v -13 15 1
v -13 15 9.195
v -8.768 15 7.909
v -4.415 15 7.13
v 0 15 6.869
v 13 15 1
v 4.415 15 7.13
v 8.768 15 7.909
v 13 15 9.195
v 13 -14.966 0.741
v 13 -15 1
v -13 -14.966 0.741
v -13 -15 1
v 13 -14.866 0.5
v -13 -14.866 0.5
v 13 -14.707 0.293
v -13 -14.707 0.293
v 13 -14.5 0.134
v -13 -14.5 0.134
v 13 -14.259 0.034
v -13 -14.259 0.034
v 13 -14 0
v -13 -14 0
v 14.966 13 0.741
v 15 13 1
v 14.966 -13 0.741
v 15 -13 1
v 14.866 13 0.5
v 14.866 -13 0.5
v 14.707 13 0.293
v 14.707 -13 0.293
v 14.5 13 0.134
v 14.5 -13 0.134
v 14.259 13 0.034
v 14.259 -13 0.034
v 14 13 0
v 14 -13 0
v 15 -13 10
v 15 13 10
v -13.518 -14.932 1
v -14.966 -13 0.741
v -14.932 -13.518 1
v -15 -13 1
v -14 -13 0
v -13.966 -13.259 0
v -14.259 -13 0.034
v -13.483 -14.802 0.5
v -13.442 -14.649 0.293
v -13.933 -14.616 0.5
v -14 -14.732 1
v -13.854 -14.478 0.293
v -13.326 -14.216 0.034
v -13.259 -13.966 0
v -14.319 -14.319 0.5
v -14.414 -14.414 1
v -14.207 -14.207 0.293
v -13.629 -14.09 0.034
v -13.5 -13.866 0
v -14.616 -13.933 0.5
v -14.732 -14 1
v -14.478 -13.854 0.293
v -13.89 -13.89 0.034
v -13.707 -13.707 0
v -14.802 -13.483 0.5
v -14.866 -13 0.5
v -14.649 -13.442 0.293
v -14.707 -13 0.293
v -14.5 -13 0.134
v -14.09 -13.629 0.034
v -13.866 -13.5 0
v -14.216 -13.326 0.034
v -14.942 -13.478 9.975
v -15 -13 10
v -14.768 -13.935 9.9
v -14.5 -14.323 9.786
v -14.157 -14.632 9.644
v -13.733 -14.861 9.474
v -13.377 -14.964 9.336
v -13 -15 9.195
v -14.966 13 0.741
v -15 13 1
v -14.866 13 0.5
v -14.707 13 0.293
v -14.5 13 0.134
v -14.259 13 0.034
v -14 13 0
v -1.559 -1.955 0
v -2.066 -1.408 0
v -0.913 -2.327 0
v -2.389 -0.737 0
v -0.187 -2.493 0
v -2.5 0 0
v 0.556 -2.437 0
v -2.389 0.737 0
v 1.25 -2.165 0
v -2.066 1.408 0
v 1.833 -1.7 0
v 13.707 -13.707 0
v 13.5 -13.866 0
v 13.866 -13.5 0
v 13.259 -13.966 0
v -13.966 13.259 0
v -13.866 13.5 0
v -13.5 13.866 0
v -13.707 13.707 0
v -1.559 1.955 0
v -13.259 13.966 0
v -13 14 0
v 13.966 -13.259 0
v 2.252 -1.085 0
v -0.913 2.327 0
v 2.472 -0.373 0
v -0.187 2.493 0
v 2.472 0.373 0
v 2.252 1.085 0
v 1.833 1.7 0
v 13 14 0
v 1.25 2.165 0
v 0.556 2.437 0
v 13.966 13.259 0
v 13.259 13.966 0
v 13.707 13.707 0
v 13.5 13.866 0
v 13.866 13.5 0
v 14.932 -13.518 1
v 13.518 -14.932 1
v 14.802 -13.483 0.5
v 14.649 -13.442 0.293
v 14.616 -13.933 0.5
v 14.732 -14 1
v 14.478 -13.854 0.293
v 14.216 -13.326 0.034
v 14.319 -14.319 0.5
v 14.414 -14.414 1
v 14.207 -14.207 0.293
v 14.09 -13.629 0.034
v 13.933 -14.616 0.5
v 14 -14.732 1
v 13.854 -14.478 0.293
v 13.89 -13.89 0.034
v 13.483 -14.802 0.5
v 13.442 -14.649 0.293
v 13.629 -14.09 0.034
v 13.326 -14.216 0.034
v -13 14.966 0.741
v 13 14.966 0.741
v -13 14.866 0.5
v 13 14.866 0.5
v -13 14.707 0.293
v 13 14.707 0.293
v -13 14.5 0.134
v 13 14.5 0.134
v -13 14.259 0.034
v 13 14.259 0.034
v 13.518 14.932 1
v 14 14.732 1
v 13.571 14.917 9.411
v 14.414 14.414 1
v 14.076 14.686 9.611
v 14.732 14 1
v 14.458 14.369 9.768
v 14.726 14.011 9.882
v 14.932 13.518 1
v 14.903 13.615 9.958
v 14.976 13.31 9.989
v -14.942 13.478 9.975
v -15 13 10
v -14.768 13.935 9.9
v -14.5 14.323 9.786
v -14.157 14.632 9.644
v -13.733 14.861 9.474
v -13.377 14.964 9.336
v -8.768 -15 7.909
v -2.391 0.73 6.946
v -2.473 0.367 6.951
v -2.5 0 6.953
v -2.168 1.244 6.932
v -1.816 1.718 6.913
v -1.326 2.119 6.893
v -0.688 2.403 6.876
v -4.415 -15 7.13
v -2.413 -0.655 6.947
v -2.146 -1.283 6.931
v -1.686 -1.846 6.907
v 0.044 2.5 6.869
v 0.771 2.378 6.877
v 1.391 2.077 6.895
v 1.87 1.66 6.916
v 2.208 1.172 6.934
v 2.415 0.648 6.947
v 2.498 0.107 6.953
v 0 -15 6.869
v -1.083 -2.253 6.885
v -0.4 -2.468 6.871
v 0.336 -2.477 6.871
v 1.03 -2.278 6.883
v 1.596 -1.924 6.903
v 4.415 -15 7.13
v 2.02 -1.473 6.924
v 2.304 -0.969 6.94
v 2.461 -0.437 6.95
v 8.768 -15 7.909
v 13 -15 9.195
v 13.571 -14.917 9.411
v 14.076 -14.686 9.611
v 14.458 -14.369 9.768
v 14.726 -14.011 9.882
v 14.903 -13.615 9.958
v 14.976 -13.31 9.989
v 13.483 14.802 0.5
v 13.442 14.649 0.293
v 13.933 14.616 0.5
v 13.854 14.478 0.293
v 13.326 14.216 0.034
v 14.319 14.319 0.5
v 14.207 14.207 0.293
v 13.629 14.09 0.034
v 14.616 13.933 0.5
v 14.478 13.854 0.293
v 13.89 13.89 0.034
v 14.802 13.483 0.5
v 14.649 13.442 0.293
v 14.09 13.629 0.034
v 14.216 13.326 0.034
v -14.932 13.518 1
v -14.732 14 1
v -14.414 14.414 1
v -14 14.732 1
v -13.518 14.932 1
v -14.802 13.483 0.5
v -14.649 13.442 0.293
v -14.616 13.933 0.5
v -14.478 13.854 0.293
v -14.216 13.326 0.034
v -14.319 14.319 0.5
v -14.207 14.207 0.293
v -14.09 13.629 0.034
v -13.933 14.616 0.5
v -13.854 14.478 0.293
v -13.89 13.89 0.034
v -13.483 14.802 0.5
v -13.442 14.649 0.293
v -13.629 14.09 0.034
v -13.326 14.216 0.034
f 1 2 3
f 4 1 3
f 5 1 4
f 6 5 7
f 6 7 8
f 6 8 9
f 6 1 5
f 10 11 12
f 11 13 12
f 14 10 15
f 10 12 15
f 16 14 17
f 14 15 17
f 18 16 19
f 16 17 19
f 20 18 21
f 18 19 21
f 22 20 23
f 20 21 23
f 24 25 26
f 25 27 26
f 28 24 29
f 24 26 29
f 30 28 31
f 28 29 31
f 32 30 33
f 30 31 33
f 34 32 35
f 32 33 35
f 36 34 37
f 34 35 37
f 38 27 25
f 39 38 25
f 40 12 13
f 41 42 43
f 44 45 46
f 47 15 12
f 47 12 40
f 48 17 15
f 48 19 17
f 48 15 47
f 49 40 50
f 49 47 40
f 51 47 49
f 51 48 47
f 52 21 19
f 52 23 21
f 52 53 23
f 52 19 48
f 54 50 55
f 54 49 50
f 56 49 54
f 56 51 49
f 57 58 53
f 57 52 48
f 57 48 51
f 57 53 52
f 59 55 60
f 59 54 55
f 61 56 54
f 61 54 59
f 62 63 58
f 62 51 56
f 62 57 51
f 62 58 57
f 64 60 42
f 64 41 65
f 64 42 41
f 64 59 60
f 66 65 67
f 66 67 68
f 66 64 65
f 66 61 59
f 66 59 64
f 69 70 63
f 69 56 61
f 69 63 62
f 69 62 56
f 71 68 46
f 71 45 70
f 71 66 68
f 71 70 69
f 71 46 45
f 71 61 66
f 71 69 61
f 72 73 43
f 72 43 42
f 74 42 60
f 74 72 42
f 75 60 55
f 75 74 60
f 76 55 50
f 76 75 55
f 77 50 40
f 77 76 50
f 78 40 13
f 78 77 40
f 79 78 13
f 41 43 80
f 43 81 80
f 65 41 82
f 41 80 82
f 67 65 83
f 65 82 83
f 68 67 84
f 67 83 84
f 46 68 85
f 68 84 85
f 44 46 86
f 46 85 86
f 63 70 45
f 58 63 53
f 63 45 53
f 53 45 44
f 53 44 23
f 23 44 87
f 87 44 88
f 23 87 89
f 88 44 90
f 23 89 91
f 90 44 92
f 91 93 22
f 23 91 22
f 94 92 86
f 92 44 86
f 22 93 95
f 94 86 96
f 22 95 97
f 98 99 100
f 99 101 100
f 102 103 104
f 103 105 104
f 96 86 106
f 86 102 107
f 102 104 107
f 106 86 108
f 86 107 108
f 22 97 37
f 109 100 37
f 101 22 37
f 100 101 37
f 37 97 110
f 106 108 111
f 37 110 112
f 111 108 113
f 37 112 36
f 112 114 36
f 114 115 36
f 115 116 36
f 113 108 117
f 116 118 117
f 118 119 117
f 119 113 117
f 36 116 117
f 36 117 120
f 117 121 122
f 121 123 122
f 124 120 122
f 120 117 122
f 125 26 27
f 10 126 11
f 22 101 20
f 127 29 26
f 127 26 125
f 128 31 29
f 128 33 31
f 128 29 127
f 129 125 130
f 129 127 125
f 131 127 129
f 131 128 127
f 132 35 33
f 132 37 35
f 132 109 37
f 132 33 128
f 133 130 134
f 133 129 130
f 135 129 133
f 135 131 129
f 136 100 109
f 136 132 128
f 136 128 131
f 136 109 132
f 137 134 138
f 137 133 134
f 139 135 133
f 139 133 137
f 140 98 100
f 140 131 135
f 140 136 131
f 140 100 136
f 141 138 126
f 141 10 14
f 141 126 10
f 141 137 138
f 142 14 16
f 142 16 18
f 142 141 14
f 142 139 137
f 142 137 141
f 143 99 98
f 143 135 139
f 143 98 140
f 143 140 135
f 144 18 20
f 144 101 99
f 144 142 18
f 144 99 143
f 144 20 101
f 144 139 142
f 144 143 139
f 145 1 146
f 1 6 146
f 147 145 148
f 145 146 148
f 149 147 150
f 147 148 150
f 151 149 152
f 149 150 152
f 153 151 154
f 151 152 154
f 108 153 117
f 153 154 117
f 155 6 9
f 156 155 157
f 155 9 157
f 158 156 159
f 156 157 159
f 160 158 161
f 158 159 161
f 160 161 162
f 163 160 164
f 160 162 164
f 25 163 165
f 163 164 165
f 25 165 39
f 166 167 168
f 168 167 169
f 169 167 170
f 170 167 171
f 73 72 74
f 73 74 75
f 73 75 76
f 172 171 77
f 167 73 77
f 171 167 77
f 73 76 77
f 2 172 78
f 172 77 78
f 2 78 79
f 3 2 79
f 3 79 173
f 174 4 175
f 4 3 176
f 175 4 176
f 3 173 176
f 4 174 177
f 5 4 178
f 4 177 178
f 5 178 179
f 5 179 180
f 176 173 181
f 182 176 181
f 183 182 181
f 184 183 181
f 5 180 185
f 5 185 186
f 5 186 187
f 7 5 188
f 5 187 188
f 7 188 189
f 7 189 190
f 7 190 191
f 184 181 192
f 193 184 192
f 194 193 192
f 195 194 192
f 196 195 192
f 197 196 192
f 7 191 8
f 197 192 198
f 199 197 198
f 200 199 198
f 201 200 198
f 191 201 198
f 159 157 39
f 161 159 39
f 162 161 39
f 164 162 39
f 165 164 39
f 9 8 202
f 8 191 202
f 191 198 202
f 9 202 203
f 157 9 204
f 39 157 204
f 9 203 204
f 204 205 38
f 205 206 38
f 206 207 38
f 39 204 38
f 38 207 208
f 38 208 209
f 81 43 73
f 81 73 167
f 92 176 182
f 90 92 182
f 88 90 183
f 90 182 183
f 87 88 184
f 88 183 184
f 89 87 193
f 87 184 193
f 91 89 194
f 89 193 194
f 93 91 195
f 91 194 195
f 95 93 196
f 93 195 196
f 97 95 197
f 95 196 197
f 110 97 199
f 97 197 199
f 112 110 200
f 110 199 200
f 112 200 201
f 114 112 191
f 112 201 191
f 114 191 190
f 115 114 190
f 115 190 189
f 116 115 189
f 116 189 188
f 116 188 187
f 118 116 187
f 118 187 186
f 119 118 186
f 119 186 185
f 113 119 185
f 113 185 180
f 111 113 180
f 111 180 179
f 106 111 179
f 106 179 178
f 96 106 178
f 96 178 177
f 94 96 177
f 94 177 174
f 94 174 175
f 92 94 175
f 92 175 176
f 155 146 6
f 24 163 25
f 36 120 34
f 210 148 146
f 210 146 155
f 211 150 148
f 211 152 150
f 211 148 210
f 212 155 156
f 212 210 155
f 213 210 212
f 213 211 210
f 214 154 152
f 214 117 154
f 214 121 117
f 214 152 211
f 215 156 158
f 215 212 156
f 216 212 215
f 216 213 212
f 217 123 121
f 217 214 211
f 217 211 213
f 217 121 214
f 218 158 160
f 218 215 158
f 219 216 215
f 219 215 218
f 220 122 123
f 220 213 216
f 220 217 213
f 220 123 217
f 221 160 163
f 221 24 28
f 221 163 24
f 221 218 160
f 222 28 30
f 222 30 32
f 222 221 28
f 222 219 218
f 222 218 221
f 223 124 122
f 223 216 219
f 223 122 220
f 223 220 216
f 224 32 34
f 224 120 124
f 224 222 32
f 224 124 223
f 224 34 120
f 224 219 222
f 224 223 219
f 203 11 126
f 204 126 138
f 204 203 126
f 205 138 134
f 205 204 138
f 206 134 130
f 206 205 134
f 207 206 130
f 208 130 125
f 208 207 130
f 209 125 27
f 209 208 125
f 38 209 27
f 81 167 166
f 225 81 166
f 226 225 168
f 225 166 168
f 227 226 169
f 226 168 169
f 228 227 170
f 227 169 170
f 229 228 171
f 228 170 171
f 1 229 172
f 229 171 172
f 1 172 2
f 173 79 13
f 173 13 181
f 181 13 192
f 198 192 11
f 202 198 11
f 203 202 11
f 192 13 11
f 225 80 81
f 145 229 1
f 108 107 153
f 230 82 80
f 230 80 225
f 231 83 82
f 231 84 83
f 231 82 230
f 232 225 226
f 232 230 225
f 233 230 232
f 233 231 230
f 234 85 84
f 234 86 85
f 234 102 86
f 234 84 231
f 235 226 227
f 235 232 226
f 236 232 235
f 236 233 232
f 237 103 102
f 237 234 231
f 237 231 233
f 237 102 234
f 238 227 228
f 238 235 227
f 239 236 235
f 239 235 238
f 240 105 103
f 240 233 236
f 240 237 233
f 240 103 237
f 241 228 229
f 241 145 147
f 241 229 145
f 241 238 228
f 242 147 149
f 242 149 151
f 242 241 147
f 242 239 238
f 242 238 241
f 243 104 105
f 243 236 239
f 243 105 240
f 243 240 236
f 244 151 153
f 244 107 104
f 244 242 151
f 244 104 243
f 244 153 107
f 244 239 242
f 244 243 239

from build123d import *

# Parameters (mm, degrees)
F0_W     = 30
F0_H     = 30
F1_DEPTH = 10
F3_DEPTH = 50
F5_D     = 5
F6_R     = 2
F7_R     = 1


with BuildPart() as f1:
    # F0 (on Top) → F1 (new body)
    with BuildSketch(Plane.XY):
        Rectangle(F0_W, F0_H)
    extrude(amount=F1_DEPTH)

    # F2 (on face) → F3 (cut)
    with BuildSketch(Plane.XZ.offset(15)):
        with BuildLine():
            Line((15, 10), (-15, 10))
            ThreePointArc((-15, 10), (0, 6.869318), (15, 10))
        make_face()
    extrude(amount=-F3_DEPTH, mode=Mode.SUBTRACT)

    # F5 (through all)
    with Locations(Plane(origin=(0, 0, 0), x_dir=(1, 0, 0), z_dir=(0, 0, -1))):
        with Locations((0, 0)):
            Hole(F5_D / 2)

    # F6
    f6_edges = [f1.edges().sort_by_distance(p)[0] for p in [
        (-15, -15, 5),
        (15, -15, 5),
        (15, 15, 5),
        (-15, 15, 5),
    ]]
    fillet(f6_edges, radius=F6_R)

    # F7
    f7_edges = [f1.edges().sort_by_distance(p)[0] for p in [
        (-15, 0, 0),
    ]]
    fillet(f7_edges, radius=F7_R)


solid = f1.part
